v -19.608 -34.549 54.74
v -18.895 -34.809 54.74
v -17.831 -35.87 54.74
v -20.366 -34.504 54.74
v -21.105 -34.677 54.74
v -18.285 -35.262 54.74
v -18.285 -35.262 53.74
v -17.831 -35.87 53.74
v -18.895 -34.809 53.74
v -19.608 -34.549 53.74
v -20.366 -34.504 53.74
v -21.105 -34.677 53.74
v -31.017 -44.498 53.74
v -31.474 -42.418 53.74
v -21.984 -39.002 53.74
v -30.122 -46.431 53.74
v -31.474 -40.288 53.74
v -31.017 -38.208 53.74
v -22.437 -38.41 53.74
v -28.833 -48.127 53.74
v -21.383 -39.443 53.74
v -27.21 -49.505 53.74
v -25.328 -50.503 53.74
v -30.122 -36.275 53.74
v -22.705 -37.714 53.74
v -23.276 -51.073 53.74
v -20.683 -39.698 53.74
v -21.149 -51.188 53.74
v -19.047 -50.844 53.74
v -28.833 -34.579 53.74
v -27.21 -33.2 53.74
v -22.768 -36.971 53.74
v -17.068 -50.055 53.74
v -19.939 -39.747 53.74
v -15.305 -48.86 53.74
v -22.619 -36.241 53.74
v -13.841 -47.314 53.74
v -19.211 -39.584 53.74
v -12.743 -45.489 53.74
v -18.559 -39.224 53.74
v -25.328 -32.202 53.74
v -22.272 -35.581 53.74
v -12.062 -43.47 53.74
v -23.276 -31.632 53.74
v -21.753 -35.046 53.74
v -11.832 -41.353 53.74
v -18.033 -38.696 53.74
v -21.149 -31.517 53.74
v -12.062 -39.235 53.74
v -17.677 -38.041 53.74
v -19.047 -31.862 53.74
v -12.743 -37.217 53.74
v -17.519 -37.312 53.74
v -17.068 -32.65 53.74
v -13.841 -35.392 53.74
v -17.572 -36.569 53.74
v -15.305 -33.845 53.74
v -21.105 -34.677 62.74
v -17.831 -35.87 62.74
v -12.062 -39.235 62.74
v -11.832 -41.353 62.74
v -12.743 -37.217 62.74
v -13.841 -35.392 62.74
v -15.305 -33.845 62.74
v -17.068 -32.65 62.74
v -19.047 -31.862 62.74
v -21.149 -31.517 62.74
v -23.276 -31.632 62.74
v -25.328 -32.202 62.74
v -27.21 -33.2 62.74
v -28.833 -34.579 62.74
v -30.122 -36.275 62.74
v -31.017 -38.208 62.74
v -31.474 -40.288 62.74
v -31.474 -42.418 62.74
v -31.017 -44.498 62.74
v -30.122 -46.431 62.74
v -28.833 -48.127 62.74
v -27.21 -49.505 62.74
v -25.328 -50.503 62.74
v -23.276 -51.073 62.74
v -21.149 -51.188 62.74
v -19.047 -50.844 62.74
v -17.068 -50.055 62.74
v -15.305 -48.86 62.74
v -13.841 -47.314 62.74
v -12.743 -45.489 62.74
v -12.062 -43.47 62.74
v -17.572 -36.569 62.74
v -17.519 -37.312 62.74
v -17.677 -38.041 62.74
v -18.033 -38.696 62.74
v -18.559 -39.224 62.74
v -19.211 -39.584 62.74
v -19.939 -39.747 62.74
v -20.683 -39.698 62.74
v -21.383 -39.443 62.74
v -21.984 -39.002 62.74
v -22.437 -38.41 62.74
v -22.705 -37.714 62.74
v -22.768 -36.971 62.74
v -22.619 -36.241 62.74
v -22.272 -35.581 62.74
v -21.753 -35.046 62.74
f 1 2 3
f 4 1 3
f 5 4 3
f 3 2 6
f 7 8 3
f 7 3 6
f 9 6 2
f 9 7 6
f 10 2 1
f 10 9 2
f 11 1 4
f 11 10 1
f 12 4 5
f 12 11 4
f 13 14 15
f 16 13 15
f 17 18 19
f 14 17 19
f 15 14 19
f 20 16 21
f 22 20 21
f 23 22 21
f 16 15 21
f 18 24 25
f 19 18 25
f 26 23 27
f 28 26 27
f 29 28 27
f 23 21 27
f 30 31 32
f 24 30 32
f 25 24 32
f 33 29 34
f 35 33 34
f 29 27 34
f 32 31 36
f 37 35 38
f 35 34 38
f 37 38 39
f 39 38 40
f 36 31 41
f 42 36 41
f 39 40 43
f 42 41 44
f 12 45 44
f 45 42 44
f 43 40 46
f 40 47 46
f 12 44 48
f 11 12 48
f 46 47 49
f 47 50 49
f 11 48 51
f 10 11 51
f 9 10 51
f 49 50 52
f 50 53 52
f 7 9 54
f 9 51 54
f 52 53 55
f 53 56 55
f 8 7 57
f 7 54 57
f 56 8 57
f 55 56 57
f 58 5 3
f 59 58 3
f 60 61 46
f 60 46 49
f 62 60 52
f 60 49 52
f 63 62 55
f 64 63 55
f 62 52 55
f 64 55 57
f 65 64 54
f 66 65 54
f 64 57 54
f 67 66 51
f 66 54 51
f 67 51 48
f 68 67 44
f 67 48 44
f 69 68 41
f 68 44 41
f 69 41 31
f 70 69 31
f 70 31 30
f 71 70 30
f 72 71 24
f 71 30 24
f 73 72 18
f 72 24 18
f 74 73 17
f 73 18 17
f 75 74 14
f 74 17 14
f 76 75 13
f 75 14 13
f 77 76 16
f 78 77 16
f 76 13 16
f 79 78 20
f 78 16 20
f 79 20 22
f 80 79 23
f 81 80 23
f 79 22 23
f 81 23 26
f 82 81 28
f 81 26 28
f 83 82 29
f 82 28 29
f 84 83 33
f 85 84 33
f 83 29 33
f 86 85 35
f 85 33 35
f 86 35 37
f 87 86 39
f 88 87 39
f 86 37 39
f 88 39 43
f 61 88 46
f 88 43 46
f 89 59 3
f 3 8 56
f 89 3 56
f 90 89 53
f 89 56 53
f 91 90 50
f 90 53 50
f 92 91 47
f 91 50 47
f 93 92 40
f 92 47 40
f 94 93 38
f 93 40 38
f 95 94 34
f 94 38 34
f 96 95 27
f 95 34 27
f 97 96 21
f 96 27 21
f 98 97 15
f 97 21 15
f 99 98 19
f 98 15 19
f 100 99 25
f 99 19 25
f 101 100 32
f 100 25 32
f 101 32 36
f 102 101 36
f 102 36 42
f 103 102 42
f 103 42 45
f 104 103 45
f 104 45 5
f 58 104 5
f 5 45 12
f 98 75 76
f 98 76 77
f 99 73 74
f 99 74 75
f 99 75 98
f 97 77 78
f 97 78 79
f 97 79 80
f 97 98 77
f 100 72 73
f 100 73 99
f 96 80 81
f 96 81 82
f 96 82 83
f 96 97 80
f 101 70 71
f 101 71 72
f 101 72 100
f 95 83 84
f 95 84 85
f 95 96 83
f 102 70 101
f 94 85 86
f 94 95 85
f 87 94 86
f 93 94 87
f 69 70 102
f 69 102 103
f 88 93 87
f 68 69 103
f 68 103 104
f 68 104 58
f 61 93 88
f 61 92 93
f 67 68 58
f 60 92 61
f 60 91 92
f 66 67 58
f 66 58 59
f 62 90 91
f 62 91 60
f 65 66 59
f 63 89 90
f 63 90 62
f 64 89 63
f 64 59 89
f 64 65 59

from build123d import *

# Parameters (mm, degrees)
BOSS_EXTRUDE1_START = 53.740316
SKETCH1_R           = 9.85
BOSS_EXTRUDE1_DEPTH = 9
CUT_EXTRUDE1_START  = -9
SKETCH2_R           = 2.63
CUT_EXTRUDE1_DEPTH  = 1


with BuildPart() as part:
    # Sketch1 → Boss-Extrude1 (new body)
    with BuildSketch(Plane.XY.offset(BOSS_EXTRUDE1_START)):
        with Locations((-21.682123493, -41.352707657)):
            Circle(SKETCH1_R)
        with BuildLine():
            Line((-21.105209467, -34.677075087), (-17.830791495, -35.869629886))
            ThreePointArc((-17.830791495, -35.869629886), (-21.042183766, -39.595614277), (-21.105209467, -34.677075087))
        make_face(mode=Mode.SUBTRACT)
    extrude(amount=BOSS_EXTRUDE1_DEPTH)

    # Sketch2 → Cut-Extrude1 (cut)
    with BuildSketch(Plane.XY.offset(62.740315649).offset(CUT_EXTRUDE1_START)):
        with Locations((-20.142161583, -37.124408079)):
            Circle(SKETCH2_R)
    extrude(amount=CUT_EXTRUDE1_DEPTH, mode=Mode.SUBTRACT)


solid = part.part
